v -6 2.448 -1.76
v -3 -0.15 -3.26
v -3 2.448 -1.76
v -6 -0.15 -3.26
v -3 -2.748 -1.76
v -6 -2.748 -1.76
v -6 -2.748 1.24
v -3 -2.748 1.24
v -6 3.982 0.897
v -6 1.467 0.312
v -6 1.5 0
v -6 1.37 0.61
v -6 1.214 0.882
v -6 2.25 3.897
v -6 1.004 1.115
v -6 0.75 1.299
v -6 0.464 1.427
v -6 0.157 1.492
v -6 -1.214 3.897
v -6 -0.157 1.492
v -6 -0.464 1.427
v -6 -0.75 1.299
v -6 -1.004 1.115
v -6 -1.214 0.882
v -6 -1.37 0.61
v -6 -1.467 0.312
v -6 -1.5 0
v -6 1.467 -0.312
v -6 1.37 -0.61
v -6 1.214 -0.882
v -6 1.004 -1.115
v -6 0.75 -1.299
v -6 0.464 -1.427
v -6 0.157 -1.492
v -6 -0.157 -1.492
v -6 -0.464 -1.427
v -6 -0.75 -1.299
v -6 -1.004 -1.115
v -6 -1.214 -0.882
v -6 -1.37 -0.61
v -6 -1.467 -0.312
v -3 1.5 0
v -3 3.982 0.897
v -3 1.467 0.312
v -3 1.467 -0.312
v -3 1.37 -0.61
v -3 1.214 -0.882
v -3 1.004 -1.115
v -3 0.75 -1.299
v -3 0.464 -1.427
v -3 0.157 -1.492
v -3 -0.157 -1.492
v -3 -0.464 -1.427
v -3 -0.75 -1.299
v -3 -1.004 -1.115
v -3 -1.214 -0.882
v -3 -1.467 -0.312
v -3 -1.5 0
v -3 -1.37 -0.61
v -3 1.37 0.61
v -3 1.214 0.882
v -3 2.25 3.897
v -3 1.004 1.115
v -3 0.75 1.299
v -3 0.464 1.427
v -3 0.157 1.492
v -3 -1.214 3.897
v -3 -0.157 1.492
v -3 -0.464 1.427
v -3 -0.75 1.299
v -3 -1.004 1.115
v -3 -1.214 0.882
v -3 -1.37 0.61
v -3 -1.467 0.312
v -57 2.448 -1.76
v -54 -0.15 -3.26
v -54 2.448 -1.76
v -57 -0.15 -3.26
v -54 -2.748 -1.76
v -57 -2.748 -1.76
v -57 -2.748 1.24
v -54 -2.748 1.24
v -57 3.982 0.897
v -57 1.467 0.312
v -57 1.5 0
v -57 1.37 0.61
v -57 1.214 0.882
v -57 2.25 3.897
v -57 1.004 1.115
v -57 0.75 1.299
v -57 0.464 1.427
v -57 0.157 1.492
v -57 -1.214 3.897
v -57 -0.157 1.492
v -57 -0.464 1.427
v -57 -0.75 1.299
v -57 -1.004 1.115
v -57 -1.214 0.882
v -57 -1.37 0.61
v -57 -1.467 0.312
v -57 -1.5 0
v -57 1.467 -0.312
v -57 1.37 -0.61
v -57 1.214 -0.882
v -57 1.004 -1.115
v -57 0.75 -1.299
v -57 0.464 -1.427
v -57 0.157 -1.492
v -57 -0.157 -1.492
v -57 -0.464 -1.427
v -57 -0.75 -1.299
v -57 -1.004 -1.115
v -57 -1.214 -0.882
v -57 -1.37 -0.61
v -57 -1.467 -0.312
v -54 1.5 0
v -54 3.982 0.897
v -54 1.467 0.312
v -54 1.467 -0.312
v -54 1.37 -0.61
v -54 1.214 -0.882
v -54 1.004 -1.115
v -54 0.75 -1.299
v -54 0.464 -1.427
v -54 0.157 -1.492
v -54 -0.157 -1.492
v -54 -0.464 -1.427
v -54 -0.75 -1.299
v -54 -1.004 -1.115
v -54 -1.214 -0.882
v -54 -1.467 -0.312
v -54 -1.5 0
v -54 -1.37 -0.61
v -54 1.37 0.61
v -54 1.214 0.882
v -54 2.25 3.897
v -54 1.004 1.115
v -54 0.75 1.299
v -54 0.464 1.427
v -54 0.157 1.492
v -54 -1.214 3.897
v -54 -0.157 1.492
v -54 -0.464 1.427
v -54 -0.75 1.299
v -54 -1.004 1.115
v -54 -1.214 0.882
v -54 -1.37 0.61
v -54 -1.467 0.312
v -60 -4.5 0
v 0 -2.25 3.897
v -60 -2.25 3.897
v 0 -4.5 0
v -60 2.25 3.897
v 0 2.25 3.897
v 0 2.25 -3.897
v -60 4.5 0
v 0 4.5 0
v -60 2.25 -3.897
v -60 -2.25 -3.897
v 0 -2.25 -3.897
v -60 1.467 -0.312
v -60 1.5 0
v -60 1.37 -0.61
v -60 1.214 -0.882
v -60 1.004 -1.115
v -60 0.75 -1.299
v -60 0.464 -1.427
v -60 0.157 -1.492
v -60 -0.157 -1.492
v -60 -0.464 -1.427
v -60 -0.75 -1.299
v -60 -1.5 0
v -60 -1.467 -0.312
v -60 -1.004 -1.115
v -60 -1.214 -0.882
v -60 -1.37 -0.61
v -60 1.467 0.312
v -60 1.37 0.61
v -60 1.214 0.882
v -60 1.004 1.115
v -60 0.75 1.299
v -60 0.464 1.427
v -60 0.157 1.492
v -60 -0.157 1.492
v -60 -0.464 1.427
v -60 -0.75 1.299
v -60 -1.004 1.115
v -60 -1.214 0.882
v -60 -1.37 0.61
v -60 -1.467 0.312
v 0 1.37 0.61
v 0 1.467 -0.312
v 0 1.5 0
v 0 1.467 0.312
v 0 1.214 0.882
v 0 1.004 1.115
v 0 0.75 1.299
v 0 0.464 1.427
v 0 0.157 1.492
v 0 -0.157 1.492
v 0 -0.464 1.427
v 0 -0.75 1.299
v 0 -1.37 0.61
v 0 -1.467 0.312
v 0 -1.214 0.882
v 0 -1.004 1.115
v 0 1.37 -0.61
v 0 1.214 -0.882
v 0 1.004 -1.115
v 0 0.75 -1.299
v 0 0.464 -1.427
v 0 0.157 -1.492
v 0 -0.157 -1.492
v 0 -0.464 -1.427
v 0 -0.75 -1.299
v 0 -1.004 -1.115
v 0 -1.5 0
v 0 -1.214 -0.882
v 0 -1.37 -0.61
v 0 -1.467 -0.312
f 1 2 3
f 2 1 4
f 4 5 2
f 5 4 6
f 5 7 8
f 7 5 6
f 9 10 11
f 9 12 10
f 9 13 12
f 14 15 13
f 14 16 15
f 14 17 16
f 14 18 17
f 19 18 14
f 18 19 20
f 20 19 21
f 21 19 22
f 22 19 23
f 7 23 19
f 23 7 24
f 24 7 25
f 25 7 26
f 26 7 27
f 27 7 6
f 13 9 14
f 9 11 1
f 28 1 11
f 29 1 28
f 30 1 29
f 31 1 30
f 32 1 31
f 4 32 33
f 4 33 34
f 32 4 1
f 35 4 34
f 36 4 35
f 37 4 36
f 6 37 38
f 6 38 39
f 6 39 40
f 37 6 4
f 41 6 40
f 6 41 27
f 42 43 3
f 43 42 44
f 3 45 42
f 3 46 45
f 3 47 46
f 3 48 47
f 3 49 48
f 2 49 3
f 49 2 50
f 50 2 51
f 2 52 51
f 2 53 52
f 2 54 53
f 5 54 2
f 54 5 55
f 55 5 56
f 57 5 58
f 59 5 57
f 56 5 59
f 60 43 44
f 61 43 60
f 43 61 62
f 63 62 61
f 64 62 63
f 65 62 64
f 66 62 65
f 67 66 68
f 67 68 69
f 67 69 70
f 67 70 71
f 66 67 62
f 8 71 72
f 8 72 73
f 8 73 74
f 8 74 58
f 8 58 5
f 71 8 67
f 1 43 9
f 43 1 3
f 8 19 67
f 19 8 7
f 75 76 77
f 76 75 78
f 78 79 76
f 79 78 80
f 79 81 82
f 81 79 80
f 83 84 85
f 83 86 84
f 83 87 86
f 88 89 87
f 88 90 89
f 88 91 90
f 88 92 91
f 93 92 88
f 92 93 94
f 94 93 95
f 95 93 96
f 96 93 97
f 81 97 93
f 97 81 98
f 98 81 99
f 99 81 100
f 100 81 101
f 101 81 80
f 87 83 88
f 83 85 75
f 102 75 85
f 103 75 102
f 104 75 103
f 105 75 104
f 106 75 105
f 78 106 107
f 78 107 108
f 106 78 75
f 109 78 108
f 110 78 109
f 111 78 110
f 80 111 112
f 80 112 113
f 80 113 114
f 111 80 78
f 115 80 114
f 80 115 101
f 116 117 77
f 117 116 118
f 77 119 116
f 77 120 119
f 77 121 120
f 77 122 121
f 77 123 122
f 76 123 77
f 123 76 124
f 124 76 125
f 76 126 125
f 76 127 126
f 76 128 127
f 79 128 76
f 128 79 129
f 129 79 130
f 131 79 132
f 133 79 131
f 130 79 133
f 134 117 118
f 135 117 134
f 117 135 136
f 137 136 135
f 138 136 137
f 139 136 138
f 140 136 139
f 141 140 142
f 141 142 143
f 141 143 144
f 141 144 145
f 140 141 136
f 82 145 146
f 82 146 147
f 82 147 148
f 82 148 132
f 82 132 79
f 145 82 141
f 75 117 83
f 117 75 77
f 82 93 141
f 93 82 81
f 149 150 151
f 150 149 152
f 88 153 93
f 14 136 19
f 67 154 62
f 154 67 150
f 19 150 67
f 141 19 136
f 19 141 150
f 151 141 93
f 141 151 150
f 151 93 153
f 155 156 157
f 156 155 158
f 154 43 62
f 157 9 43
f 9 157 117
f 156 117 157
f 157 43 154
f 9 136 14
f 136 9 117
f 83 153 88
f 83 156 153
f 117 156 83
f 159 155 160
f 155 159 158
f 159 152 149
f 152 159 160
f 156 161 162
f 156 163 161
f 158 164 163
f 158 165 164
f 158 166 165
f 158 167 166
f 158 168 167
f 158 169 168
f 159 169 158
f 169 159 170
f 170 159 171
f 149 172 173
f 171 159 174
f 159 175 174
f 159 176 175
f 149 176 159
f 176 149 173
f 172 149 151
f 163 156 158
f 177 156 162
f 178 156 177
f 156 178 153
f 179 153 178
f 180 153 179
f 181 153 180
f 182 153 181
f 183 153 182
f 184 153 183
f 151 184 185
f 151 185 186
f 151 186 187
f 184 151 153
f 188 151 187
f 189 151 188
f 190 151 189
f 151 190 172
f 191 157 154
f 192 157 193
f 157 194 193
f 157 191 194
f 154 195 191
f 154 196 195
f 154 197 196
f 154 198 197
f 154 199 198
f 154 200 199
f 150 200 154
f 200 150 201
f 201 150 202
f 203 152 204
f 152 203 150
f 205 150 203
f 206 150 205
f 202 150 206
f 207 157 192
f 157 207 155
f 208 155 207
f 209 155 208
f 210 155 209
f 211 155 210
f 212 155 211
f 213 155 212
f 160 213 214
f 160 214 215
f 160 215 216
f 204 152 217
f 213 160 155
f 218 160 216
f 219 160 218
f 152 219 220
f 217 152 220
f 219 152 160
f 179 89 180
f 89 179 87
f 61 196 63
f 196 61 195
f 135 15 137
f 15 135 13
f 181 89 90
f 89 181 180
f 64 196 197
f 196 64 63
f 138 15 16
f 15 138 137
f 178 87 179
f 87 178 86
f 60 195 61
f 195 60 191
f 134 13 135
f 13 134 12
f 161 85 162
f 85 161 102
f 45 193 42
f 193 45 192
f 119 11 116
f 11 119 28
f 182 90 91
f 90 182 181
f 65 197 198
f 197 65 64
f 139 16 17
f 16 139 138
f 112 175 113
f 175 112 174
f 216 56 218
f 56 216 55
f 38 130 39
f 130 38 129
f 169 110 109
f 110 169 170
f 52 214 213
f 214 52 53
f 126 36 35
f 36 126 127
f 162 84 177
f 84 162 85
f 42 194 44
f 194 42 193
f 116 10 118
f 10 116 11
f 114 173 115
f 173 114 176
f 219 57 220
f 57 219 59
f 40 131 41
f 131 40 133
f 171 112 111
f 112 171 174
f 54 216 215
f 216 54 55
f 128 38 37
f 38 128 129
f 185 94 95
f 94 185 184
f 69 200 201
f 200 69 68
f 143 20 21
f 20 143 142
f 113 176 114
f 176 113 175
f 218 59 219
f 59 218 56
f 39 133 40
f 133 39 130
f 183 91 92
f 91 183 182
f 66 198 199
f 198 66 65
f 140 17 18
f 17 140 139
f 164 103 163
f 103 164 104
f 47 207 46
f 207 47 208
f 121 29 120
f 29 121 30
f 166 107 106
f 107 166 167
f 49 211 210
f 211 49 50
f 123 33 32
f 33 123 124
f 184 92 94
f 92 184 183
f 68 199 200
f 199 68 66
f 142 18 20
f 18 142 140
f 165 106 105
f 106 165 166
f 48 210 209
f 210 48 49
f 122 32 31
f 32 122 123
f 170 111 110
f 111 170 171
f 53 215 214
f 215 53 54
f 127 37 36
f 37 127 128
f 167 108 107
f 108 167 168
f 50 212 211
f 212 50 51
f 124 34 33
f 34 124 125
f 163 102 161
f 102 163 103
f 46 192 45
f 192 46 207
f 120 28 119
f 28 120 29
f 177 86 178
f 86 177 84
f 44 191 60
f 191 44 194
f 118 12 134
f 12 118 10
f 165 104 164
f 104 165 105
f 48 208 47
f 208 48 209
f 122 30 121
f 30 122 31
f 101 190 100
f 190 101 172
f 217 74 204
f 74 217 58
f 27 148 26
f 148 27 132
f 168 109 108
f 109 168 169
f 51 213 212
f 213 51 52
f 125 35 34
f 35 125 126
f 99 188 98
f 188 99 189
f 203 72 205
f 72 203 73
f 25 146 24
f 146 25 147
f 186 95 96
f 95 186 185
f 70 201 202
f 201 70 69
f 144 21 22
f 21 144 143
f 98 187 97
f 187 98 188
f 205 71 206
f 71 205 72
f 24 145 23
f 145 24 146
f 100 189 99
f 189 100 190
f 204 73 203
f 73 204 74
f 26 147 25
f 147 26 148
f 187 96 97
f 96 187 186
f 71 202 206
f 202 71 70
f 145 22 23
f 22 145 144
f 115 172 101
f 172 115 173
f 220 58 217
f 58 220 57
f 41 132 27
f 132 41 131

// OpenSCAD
/*
 * Simple M3 Standoff. 
 * Easy to print, cheap and reduces weight compared
 * to the ones made of brass.
 *
 * Frederik Priede, 2019
 */
$fn=30;

INLET_WIDTH = 6;
INLET_HEIGHT = 3;
PILLAR_DIAMETER = 9;
PILLAR_HEIGHT = 60;



module create_nut_clipping(pos) {
   translate(pos) {
        union(){
            rotate([0,0,30]){
                cylinder(d=INLET_WIDTH,h = INLET_HEIGHT, $fn=6);
            }
            translate([0,-INLET_WIDTH / 2,0]){
                cube([15, INLET_WIDTH, INLET_HEIGHT]);
            }
        }
    }   
}


// create the spacer
module m3_spacer() {
    difference() {
        cylinder(d=PILLAR_DIAMETER, h=PILLAR_HEIGHT, $fn=6);
        translate([0, 0, -0.1]) {
            cylinder(d=3, h=PILLAR_HEIGHT + 2 * 0.1);    
        };
        create_nut_clipping([-0.3, 0, 3]);
        create_nut_clipping([-0.3, 0, PILLAR_HEIGHT -3 - INLET_HEIGHT]);
    }
}

// position everything to make printing easier.
rotate([-30, 0, 0]){
    rotate([0, -90, 0]){
        m3_spacer();
    };
};
